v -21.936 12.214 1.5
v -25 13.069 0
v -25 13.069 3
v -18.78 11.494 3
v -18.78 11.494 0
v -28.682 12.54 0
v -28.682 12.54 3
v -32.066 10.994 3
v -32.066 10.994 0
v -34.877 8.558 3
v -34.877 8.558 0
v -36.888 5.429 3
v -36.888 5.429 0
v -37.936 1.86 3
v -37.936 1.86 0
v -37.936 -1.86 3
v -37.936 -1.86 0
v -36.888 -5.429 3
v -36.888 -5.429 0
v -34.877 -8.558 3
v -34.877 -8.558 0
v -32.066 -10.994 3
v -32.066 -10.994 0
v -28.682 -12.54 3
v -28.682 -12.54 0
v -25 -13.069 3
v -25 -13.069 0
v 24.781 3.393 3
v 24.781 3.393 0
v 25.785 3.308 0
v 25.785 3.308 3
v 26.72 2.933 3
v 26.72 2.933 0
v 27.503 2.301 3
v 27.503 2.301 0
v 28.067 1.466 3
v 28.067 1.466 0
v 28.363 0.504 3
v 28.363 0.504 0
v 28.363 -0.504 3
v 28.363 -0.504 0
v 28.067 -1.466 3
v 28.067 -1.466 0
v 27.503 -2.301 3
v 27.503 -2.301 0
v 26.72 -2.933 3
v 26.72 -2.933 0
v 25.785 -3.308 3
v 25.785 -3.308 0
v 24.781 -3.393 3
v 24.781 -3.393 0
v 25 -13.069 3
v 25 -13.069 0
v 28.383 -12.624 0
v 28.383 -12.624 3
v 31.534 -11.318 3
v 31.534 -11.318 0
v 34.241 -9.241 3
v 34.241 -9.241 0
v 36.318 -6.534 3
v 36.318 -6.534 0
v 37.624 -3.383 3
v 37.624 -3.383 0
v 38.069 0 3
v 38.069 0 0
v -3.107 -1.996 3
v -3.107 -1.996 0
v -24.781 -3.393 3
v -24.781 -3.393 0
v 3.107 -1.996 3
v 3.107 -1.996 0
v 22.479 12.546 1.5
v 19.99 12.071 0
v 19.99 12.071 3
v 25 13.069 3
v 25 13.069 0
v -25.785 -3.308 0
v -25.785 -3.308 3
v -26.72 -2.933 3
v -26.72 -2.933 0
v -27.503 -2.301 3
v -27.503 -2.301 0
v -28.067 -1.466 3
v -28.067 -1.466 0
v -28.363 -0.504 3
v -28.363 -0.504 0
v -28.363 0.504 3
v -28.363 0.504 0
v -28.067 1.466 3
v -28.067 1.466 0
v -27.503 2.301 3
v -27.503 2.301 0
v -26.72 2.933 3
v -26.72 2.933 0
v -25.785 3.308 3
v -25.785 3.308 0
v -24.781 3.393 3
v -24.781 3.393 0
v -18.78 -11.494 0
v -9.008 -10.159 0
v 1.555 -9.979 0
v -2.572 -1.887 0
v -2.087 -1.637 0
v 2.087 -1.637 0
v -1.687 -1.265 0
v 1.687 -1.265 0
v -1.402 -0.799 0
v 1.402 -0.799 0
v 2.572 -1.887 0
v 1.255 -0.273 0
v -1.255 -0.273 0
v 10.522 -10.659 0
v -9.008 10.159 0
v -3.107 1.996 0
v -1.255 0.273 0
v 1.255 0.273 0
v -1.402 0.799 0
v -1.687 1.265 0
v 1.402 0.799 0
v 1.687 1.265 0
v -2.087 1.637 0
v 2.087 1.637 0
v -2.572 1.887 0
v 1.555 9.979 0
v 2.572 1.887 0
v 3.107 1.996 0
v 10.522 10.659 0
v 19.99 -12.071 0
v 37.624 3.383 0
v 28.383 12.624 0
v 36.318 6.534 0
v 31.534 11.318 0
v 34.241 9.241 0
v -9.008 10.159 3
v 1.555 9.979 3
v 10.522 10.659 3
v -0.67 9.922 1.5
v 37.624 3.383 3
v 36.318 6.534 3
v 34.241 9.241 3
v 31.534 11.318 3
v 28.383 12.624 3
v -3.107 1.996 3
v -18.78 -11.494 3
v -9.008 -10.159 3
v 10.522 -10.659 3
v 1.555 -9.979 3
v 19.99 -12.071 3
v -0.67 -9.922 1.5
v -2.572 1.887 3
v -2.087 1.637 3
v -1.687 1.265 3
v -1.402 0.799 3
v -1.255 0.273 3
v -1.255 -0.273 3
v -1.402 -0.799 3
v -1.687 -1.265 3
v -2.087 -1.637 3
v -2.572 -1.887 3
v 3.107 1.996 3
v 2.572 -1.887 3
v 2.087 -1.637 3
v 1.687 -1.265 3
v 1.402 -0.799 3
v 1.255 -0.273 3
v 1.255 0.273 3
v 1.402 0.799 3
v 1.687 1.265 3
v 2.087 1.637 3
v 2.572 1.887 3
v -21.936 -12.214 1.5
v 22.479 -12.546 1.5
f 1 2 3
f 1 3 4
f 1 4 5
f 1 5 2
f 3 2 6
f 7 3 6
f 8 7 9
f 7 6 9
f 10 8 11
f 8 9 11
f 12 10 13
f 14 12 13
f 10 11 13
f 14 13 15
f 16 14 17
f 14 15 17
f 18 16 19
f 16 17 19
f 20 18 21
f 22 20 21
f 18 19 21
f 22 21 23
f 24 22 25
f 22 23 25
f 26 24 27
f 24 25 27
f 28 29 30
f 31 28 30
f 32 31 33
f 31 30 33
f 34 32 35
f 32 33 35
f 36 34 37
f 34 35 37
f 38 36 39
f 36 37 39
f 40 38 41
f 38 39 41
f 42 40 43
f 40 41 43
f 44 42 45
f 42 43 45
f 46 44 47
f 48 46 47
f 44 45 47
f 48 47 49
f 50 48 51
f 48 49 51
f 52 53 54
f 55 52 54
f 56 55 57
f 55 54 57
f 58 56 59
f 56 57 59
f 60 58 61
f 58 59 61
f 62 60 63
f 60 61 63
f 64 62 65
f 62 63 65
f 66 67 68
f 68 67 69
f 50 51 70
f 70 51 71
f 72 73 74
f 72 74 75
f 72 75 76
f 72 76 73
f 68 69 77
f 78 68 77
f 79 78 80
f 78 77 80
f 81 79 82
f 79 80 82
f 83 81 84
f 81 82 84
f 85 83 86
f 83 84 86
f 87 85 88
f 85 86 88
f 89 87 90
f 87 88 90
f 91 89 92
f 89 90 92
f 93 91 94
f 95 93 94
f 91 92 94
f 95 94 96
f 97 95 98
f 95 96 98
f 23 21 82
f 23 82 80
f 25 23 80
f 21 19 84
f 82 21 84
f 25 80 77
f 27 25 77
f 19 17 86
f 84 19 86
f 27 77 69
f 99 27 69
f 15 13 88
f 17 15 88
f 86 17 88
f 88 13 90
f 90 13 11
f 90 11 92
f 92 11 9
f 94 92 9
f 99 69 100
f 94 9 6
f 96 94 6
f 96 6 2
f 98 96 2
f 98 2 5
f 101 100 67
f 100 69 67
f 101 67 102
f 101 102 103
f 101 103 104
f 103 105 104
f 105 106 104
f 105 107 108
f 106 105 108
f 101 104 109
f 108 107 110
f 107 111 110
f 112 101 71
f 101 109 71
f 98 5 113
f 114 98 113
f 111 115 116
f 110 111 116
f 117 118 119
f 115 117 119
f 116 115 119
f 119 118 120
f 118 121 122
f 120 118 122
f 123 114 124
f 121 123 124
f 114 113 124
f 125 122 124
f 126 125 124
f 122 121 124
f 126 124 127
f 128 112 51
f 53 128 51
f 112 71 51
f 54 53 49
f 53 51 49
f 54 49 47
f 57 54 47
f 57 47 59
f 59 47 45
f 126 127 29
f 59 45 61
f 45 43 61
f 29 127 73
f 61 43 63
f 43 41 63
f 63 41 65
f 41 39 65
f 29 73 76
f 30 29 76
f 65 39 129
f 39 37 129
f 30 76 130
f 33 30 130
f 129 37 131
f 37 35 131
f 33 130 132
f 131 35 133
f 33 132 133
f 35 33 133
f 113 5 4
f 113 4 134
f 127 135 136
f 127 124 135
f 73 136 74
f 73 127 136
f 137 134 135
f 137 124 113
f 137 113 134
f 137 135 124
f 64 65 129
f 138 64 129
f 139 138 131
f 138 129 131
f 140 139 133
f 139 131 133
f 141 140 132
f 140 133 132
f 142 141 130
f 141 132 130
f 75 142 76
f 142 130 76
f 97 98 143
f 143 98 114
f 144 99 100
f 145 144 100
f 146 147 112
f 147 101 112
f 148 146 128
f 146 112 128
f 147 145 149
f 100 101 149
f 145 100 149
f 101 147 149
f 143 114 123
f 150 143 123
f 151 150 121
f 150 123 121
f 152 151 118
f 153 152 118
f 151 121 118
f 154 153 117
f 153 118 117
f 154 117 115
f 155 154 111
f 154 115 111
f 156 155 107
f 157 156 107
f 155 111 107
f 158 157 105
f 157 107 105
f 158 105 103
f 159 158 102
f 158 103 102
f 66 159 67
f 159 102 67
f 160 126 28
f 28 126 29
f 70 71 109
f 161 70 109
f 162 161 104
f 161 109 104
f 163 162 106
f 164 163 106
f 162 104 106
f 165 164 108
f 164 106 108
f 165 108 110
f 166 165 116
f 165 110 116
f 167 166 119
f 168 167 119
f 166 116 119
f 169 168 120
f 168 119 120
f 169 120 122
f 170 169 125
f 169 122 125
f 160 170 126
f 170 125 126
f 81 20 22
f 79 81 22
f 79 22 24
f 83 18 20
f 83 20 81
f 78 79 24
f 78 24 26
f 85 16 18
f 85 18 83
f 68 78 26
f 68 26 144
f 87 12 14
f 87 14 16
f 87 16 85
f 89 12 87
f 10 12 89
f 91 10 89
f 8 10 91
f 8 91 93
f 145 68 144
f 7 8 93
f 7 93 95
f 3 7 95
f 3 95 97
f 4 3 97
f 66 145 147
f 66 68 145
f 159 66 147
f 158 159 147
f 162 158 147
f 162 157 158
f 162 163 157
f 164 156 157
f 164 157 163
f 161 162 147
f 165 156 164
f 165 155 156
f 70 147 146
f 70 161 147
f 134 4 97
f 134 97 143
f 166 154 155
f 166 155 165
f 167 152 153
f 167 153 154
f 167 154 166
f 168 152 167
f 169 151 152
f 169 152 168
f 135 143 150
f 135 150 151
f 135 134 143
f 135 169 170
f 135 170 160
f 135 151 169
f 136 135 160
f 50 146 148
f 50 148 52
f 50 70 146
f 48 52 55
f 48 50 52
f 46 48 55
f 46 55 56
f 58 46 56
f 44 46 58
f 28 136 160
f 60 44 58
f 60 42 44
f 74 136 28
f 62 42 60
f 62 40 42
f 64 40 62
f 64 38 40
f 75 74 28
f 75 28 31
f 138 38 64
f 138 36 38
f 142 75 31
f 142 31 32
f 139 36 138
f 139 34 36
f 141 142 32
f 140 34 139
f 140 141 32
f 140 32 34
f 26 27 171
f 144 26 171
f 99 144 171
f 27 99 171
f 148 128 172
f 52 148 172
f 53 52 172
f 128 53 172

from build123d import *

# Parameters (mm, degrees)
BOSS_EXTRUDE2_DEPTH = 3


with BuildPart() as part:
    # Sketch1 → Boss-Extrude2 (new body)
    with BuildSketch(Plane.XY):
        with BuildLine():
            ThreePointArc((-24.781290204, -3.3929583), (-28.4, 0), (-24.781290204, 3.3929583))
            Line((-24.781290204, 3.3929583), (-12.188441083, 2.581224344))
            ThreePointArc((-12.188441083, 2.581224344), (-14.492522891, 7.771208774), (-18.780288742, 11.494083385))
            add(Edge.make_bspline(
                [(-25, 13.069), (-21.982355601, 12.146946089), (-18.780288742, 11.494083385)],
                knots=[0, 0, 0, 0.145973682, 0.145973682, 0.145973682], degree=2))
            ThreePointArc((-25, 13.069), (-38.069, 0), (-25, -13.069))
            add(Edge.make_bspline(
                [(-25, -13.069), (-21.982355601, -12.146946089), (-18.780288742, -11.494083385)],
                knots=[0, 0, 0, 0.145973682, 0.145973682, 0.145973682], degree=2))
            ThreePointArc((-18.780288742, -11.494083385), (-14.492522891, -7.771208774), (-12.188441083, -2.581224344))
            Line((-12.188441083, -2.581224344), (-24.781290204, -3.3929583))
        make_face()
        with BuildLine():
            ThreePointArc((-18.780288742, 11.494083385), (-14.492522891, 7.771208774), (-12.188441083, 2.581224344))
            Line((-12.188441083, 2.581224344), (-3.107347179, 1.995857823))
            ThreePointArc((-3.107347179, 1.995857823), (-1.236, 0), (-3.107347179, -1.995857823))
            Line((-3.107347179, -1.995857823), (-12.188441083, -2.581224344))
            ThreePointArc((-12.188441083, -2.581224344), (-14.492522891, -7.771208774), (-18.780288742, -11.494083385))
            add(Edge.make_bspline(
                [(-18.780288742, -11.494083385), (-1.944343038, -8.061437688), (19.989933944, -12.070542619)],
                knots=[0.145973682, 0.145973682, 0.145973682, 0.91347951, 0.91347951, 0.91347951], degree=2))
            ThreePointArc((19.989933944, -12.070542619), (14.904735293, -8.299662132), (12.188441083, -2.581224344))
            Line((12.188441083, -2.581224344), (3.107347179, -1.995857823))
            ThreePointArc((3.107347179, -1.995857823), (1.236, 0), (3.107347179, 1.995857823))
            Line((3.107347179, 1.995857823), (12.188441083, 2.581224344))
            ThreePointArc((12.188441083, 2.581224344), (14.904735293, 8.299662132), (19.989933944, 12.070542619))
            add(Edge.make_bspline(
                [(-18.780288742, 11.494083385), (-1.944343038, 8.061437688), (19.989933944, 12.070542619)],
                knots=[0.145973682, 0.145973682, 0.145973682, 0.91347951, 0.91347951, 0.91347951], degree=2))
        make_face()
        with BuildLine():
            add(Edge.make_bspline(
                [(19.989933944, 12.070542619), (22.462572371, 12.522486712), (25, 13.069)],
                knots=[0.91347951, 0.91347951, 0.91347951, 1, 1, 1], degree=2))
            ThreePointArc((19.989933944, 12.070542619), (14.904735293, 8.299662132), (12.188441083, 2.581224344))
            Line((12.188441083, 2.581224344), (24.781290204, 3.3929583))
            ThreePointArc((24.781290204, 3.3929583), (28.4, 0), (24.781290204, -3.3929583))
            Line((24.781290204, -3.3929583), (12.188441083, -2.581224344))
            ThreePointArc((12.188441083, -2.581224344), (14.904735293, -8.299662132), (19.989933944, -12.070542619))
            add(Edge.make_bspline(
                [(19.989933944, -12.070542619), (22.462572371, -12.522486712), (25, -13.069)],
                knots=[0.91347951, 0.91347951, 0.91347951, 1, 1, 1], degree=2))
            ThreePointArc((25, -13.069), (34.241178523, -9.241178523), (38.069, 0))
            ThreePointArc((38.069, 0), (34.241178523, 9.241178523), (25, 13.069))
        make_face()
    extrude(amount=BOSS_EXTRUDE2_DEPTH)


solid = part.part
